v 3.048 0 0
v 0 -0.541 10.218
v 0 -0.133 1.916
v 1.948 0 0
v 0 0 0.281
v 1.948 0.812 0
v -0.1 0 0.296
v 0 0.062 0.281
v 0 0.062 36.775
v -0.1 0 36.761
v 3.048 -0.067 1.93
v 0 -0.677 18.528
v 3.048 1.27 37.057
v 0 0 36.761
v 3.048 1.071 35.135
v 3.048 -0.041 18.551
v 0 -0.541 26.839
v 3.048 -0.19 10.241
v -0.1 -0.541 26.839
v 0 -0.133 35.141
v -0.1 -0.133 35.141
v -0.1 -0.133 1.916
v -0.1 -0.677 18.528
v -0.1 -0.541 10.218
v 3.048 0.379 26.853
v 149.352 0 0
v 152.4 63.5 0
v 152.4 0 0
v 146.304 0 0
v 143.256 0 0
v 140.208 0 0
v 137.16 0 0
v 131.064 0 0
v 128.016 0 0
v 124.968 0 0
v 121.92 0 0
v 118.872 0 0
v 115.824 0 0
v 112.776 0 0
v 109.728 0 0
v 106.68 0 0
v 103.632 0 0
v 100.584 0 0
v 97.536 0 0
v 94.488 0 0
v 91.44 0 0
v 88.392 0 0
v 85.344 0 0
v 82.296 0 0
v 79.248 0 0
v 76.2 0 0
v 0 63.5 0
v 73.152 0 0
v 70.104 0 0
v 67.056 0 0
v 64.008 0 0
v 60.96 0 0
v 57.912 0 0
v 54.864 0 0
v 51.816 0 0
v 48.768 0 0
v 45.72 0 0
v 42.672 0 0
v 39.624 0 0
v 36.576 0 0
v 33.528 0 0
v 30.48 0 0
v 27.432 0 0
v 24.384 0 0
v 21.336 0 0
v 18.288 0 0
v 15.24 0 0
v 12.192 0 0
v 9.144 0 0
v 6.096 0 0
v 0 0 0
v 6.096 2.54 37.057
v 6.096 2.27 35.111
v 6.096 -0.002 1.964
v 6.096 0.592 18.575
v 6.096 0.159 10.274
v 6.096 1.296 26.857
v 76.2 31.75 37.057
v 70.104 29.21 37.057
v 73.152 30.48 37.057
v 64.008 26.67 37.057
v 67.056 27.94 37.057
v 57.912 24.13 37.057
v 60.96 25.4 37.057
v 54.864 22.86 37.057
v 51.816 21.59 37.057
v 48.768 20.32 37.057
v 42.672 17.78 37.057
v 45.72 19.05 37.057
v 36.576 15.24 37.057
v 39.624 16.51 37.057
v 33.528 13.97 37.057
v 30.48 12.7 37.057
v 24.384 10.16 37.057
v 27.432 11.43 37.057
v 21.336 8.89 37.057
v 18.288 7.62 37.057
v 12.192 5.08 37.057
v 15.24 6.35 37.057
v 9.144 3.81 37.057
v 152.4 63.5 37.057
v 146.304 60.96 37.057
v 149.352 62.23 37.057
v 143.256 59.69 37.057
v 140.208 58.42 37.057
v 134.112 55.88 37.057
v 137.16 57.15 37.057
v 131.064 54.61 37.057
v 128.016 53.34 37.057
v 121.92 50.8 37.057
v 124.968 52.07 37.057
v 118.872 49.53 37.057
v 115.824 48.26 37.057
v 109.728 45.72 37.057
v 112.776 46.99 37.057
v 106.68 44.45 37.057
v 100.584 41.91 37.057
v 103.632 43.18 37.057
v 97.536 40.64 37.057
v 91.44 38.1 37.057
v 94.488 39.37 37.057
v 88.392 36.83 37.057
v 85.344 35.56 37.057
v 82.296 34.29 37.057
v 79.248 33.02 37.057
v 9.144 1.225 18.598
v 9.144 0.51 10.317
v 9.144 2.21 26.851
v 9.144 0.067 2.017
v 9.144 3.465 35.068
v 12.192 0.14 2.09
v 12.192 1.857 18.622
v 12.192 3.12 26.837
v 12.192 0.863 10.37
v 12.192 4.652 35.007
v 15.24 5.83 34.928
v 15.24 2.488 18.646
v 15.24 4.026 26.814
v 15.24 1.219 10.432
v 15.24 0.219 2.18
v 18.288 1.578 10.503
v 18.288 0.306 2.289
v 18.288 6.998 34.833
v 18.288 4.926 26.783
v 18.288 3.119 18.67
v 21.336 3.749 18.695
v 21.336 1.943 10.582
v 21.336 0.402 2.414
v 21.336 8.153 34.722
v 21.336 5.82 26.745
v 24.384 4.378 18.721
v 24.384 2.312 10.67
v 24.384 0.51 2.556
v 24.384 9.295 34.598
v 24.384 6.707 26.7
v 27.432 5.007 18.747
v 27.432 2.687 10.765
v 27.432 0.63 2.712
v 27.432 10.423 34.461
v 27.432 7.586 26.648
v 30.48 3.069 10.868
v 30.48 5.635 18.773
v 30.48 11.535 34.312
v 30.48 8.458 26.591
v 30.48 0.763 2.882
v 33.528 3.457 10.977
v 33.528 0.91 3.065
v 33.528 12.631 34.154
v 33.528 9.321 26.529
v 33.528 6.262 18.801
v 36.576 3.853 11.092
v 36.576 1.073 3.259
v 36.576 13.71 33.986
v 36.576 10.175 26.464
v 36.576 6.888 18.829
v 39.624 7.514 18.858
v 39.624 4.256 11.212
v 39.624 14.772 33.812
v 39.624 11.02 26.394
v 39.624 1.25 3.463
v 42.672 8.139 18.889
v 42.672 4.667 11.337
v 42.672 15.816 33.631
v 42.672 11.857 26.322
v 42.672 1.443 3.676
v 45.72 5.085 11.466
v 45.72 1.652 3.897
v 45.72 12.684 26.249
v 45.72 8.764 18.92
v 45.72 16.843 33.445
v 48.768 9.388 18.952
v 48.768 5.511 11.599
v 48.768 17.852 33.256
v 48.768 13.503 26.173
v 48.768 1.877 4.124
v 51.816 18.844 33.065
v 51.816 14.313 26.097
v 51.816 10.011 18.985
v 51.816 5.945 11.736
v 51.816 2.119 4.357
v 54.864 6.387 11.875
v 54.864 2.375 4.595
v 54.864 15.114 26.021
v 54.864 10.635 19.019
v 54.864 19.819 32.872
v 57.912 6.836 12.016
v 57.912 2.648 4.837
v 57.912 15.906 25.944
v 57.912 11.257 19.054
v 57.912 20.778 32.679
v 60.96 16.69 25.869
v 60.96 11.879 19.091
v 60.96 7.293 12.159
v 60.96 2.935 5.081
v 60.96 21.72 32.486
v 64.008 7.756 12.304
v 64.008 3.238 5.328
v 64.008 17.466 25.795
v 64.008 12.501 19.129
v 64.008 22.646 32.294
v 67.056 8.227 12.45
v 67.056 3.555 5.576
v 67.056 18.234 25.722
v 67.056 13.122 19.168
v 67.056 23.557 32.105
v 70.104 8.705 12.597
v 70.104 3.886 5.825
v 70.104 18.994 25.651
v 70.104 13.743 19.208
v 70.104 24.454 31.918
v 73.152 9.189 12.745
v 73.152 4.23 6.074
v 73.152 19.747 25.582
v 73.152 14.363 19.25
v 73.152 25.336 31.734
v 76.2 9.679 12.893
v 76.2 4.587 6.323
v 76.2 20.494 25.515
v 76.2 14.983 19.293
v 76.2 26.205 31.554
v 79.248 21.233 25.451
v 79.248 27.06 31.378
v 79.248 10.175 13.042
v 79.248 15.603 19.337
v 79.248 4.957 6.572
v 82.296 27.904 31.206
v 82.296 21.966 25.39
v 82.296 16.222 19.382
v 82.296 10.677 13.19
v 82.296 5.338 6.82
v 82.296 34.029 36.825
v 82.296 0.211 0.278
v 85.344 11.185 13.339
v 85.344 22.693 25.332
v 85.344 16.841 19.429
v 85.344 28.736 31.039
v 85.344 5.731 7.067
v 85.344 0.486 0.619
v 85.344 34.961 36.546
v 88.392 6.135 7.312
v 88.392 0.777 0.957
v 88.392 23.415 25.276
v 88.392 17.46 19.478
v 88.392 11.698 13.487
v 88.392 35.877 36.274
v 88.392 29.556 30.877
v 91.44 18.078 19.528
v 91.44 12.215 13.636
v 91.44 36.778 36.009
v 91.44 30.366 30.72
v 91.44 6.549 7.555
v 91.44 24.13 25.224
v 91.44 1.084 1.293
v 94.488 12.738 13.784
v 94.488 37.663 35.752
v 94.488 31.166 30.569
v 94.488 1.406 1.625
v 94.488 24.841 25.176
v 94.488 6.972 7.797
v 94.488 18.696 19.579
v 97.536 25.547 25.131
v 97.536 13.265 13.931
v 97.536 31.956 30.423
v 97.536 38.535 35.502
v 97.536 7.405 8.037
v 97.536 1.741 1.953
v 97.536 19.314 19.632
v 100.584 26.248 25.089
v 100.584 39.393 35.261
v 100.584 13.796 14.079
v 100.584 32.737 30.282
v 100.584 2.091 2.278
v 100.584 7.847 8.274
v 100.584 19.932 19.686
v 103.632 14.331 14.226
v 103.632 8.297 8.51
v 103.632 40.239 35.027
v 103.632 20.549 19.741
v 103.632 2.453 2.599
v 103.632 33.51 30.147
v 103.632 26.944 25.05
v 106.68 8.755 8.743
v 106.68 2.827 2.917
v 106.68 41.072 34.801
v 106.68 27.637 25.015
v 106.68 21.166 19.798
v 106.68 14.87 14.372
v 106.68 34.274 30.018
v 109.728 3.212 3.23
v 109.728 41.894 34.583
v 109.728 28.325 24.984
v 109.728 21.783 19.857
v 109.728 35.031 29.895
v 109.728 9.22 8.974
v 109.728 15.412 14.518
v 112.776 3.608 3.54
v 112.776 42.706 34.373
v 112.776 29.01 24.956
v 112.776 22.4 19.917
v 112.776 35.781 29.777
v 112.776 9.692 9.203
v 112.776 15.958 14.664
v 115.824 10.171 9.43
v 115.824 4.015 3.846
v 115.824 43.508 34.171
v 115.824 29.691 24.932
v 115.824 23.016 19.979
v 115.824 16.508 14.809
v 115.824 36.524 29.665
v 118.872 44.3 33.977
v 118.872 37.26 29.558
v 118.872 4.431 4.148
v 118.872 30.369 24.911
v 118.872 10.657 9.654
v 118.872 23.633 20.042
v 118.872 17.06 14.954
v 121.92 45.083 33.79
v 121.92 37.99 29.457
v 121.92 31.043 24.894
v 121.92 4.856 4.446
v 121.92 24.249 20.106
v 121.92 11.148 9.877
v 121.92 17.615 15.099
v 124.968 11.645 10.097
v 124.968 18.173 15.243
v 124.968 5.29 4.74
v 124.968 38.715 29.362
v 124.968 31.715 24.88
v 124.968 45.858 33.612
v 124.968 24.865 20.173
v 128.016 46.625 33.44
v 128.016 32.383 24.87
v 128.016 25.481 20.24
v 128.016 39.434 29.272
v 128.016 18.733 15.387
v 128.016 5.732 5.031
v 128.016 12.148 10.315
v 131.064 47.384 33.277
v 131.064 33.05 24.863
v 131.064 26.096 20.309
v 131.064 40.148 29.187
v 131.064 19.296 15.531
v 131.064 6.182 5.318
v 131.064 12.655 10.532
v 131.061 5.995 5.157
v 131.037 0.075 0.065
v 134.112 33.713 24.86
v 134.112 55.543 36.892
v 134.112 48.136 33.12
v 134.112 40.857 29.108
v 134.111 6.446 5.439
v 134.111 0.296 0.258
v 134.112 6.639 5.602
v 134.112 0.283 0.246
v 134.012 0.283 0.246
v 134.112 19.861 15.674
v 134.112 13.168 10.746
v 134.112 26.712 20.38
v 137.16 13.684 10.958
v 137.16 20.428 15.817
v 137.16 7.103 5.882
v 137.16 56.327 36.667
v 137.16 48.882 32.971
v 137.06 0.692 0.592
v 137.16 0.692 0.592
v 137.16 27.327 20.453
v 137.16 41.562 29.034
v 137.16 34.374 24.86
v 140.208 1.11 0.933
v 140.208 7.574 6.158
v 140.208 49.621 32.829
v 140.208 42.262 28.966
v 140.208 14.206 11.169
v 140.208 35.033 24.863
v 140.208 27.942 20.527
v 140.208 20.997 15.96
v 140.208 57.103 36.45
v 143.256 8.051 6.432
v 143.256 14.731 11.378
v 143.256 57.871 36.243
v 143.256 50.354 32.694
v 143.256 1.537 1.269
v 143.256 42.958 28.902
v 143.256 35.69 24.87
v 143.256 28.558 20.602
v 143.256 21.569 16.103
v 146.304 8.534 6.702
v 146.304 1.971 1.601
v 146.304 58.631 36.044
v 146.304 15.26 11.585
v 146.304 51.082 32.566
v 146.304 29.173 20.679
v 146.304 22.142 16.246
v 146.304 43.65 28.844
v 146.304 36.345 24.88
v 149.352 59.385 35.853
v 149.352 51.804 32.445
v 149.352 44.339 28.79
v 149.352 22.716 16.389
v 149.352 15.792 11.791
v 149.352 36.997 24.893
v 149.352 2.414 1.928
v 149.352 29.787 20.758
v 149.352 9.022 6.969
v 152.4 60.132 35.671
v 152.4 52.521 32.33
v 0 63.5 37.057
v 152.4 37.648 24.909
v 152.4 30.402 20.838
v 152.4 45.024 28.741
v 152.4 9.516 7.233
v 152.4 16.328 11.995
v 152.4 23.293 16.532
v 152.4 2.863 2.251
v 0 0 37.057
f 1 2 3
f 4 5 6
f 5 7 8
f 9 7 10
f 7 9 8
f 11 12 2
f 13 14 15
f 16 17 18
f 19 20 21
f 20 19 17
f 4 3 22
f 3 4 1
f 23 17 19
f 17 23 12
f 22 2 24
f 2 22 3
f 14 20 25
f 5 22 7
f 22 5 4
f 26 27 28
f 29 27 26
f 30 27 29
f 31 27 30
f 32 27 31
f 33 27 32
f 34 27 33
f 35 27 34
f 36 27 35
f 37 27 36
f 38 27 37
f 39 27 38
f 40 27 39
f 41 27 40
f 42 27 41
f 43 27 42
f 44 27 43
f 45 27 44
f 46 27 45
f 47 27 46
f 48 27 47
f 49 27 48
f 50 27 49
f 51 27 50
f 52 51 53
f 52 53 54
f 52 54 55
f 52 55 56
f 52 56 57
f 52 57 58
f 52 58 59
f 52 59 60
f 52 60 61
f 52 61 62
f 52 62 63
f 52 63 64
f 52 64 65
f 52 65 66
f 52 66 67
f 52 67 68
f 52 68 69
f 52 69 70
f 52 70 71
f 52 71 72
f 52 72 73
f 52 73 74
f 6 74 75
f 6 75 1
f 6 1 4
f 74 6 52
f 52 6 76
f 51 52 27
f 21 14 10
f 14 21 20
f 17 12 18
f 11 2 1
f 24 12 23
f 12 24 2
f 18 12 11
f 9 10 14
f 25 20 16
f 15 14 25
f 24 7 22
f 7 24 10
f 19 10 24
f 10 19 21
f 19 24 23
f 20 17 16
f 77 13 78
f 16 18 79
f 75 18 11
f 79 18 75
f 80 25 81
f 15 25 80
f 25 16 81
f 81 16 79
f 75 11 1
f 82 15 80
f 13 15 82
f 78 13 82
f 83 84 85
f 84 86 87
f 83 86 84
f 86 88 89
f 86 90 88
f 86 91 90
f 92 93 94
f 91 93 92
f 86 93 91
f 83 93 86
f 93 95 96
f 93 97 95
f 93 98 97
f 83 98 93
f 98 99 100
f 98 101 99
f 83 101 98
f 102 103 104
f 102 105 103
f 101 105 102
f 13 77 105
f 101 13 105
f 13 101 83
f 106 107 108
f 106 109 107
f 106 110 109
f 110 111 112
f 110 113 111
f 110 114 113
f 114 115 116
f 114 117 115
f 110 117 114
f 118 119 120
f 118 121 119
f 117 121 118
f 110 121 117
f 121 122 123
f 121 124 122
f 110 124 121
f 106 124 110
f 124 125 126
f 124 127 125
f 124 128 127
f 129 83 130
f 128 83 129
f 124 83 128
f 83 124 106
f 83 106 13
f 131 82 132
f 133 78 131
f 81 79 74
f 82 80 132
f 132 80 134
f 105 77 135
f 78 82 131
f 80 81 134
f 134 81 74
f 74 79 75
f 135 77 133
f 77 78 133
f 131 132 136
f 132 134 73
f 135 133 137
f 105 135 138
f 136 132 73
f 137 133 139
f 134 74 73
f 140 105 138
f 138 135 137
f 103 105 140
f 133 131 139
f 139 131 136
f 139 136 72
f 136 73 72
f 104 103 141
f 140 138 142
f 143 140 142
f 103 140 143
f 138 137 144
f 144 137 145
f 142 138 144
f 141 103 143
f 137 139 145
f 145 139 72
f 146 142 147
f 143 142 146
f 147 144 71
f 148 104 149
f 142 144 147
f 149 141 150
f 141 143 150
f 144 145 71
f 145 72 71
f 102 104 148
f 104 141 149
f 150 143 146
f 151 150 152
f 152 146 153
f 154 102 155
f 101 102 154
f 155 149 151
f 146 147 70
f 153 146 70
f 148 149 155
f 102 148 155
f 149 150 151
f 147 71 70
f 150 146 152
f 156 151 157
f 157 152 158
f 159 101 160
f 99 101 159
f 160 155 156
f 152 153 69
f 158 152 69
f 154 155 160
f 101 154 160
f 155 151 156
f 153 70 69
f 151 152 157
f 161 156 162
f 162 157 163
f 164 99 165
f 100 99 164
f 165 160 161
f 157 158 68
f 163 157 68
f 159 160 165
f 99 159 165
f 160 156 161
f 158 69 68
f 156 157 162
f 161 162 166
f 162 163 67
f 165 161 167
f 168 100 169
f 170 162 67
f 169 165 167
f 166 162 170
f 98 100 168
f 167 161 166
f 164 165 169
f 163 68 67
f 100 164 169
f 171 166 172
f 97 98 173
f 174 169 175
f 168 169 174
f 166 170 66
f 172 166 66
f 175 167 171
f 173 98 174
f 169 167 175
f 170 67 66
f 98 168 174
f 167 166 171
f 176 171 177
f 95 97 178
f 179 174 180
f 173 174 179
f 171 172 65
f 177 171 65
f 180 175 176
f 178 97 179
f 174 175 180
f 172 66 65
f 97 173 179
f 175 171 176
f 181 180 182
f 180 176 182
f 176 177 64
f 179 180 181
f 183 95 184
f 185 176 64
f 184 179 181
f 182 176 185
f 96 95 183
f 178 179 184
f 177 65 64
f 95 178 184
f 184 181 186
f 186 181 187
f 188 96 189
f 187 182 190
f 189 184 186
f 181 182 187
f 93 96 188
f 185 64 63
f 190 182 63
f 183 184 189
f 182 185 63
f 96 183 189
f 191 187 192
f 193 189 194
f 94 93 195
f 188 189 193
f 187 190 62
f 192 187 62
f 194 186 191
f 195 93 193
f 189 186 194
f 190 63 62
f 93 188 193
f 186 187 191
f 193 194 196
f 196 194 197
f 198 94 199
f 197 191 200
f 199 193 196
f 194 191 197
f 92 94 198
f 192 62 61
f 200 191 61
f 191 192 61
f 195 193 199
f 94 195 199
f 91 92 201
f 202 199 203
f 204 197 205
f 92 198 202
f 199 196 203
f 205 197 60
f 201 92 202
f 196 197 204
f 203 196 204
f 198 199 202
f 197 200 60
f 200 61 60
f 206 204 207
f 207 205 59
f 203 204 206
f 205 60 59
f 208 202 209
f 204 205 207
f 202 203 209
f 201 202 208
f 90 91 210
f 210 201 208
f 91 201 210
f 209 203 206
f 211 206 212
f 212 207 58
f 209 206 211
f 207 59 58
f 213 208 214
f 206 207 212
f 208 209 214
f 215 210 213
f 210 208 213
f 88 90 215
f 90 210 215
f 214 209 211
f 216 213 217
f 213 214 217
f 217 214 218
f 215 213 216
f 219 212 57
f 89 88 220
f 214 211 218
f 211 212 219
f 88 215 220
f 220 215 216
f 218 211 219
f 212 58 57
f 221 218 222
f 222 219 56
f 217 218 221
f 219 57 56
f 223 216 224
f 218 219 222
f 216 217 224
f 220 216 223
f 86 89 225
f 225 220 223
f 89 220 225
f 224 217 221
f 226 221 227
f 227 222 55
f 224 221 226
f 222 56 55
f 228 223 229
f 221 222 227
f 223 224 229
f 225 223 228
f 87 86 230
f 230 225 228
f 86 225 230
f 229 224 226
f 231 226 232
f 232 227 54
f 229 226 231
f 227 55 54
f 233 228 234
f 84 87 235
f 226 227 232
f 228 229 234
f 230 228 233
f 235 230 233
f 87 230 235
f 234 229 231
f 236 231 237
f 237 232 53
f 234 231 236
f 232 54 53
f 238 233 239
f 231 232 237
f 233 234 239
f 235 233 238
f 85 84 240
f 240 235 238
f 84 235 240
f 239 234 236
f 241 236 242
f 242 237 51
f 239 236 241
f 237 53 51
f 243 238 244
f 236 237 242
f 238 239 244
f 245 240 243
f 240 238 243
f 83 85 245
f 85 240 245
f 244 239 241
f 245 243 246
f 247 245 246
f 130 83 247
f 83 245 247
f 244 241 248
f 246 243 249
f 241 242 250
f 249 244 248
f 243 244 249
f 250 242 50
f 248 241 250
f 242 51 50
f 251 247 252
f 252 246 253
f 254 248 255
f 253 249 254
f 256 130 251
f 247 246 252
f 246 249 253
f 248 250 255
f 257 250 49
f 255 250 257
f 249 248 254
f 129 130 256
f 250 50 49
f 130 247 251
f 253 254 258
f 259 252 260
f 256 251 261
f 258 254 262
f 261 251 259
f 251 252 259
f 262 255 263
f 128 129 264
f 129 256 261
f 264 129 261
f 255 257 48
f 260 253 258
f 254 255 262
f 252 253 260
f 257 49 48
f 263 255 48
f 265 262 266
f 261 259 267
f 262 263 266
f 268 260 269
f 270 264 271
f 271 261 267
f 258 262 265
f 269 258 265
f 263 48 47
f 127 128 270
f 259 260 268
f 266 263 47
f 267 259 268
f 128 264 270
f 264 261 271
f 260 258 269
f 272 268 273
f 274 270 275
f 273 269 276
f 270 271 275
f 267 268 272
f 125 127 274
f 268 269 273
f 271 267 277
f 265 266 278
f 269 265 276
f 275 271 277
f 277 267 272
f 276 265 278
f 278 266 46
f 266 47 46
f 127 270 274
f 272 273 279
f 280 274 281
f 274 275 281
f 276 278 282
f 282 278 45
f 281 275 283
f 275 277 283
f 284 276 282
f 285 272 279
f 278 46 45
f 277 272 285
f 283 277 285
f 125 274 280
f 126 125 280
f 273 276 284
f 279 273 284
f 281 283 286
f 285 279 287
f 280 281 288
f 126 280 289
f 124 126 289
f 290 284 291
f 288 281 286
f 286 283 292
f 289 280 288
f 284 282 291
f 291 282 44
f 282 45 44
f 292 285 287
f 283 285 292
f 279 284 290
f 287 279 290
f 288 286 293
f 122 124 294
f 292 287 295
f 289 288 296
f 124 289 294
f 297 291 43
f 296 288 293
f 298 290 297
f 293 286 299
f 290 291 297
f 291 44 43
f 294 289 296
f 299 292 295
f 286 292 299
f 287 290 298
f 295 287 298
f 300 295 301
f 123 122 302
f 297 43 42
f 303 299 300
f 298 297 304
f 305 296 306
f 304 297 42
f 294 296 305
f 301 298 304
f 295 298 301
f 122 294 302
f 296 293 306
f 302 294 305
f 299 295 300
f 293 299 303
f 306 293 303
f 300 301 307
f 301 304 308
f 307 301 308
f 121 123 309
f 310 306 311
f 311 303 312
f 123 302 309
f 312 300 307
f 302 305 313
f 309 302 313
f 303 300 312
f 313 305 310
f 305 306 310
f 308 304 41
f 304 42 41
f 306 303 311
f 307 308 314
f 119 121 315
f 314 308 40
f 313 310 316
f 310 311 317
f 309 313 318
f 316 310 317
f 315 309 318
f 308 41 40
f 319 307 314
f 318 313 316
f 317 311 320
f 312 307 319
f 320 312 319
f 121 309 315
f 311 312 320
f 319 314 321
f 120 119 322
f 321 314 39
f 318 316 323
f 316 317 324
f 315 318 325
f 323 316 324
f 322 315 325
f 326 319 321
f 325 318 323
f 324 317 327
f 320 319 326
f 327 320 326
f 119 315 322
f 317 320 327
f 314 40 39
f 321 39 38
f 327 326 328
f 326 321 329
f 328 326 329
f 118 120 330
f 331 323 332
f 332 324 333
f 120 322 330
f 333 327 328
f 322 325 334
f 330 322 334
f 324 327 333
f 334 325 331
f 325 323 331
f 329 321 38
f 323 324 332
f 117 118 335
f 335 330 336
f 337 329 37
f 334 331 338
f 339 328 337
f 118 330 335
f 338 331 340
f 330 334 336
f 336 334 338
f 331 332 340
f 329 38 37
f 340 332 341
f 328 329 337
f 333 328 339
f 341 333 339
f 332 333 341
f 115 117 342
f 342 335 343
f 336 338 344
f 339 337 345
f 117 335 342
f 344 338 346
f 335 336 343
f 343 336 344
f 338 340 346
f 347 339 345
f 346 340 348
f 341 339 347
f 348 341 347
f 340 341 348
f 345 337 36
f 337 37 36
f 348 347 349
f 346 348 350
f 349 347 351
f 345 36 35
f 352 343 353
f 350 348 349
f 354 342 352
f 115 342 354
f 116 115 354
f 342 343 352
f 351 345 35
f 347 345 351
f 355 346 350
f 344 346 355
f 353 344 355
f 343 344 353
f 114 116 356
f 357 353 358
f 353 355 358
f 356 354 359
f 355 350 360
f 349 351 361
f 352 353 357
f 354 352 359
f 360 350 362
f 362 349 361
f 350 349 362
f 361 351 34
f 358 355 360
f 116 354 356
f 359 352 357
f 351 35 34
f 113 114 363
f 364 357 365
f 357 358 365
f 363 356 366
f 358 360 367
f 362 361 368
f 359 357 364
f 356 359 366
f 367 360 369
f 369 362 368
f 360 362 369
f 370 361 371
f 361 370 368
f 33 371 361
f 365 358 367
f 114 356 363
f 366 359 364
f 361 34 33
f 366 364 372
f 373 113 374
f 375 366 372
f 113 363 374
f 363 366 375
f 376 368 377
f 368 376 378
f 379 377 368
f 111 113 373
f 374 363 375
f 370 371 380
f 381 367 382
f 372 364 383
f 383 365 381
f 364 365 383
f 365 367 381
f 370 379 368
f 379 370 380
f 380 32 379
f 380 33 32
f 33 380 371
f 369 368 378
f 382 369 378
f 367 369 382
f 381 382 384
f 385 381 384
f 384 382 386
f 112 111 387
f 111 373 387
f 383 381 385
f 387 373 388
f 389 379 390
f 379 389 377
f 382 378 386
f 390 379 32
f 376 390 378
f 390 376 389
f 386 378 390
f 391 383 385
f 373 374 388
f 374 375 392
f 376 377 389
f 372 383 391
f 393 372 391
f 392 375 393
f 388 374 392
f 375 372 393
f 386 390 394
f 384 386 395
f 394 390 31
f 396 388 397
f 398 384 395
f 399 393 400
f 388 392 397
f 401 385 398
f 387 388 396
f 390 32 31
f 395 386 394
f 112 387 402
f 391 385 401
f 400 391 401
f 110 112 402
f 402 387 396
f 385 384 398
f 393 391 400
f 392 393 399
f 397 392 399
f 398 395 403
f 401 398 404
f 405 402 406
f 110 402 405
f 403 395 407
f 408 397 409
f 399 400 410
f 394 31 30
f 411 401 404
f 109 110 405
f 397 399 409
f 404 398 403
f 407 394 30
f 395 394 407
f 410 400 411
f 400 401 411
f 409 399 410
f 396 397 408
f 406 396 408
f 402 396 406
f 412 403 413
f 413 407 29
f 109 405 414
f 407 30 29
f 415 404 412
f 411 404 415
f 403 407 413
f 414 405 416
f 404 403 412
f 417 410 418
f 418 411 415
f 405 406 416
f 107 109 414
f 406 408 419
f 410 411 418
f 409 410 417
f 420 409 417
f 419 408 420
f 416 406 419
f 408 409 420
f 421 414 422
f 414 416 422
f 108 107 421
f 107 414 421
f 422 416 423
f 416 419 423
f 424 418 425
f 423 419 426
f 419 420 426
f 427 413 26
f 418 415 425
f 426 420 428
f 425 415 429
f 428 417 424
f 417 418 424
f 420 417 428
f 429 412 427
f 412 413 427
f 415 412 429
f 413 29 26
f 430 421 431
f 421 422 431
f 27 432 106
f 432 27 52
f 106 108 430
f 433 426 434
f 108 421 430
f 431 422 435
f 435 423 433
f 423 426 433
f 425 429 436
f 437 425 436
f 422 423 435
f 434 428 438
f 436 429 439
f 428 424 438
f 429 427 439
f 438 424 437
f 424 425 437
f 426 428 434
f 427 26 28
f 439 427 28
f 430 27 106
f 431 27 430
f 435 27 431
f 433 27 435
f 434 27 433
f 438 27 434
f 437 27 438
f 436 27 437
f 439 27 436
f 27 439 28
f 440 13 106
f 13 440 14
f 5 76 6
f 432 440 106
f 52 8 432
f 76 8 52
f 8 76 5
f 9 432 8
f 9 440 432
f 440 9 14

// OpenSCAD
 
/* [Dimensions] */
// Prop hub to tip along the x-axis
prop_dia_in = 12.0;

// Theoretical distance traved in one revelution
prop_pitch_in = 22.0;

// Width of rectangular block
block_width_in = 2.5;

/* [Options] */ 
// Cross Sections
xsection="curved";  // [curved:Circular,flat:Flat]

// Radius of curcved cross section
camber_radius_in = 10.0;

// Divisions between root and tip
sections = 50;
 
/* [Hidden] */
mm = 25.4;
$fn = 192;

prop_dia = prop_dia_in * mm;
prop_pitch = prop_pitch_in * mm;
block_width = block_width_in *mm;
camber_radius = camber_radius_in * mm;

// https://indoornewsandviews.files.wordpress.com/2012/10/inav_121_press.pdf
// From page 22, Indoor Props - Practice
function t_block(d, p, w) = p*w/(3.14159*d);

// Determine the height of an enclosing block given the above formula 
block_height =  t_block(prop_dia, prop_pitch, block_width);

// Fill in the basic block shape
linear_extrude(block_height) polygon([[0,0],[prop_dia/2, block_width], [0, block_width]]);

// Iterate over the blade cross sections
for(i=[0:sections-1]) {
    hull() {
        blade_section(i, block_width, block_height, sections, camber_radius, xsection);
        blade_section(i+1, block_width, block_height, sections, camber_radius, xsection);
    }
}


module circular_segment(R, c)
{
    // see https://en.wikipedia.org/wiki/Circular_segment
    d = sqrt(R*R-(c*c)/4);
    linear_extrude(0.1) difference() {
        translate([-d,0,0]) circle(R);
        translate([-R,0,0]) square(2*R, center=true);
    }
}


 module blade_section(i, width, height, sections, camber_rad=125, xsection)
 {
    width_i = i*width/sections;
    chord_i = sqrt(height*height+width_i*width_i);
    angle_i = atan(width_i / height);

    translate([(i/sections)*prop_dia/2,0,0]) {
        // generate and orient the circular segments
        if (xsection == "curved") {
            rotate([-angle_i,0,0]) 
                translate([0, 0, chord_i/2]) 
                    rotate([90, 0, -90]) circular_segment(camber_rad, chord_i);
        }
        // generate trianble to 'support' the circular segments
        rotate([0,-90,0]) linear_extrude(1.1) 
            polygon([[0,0], [0, width_i], [height, width_i]]);
    }      
}
